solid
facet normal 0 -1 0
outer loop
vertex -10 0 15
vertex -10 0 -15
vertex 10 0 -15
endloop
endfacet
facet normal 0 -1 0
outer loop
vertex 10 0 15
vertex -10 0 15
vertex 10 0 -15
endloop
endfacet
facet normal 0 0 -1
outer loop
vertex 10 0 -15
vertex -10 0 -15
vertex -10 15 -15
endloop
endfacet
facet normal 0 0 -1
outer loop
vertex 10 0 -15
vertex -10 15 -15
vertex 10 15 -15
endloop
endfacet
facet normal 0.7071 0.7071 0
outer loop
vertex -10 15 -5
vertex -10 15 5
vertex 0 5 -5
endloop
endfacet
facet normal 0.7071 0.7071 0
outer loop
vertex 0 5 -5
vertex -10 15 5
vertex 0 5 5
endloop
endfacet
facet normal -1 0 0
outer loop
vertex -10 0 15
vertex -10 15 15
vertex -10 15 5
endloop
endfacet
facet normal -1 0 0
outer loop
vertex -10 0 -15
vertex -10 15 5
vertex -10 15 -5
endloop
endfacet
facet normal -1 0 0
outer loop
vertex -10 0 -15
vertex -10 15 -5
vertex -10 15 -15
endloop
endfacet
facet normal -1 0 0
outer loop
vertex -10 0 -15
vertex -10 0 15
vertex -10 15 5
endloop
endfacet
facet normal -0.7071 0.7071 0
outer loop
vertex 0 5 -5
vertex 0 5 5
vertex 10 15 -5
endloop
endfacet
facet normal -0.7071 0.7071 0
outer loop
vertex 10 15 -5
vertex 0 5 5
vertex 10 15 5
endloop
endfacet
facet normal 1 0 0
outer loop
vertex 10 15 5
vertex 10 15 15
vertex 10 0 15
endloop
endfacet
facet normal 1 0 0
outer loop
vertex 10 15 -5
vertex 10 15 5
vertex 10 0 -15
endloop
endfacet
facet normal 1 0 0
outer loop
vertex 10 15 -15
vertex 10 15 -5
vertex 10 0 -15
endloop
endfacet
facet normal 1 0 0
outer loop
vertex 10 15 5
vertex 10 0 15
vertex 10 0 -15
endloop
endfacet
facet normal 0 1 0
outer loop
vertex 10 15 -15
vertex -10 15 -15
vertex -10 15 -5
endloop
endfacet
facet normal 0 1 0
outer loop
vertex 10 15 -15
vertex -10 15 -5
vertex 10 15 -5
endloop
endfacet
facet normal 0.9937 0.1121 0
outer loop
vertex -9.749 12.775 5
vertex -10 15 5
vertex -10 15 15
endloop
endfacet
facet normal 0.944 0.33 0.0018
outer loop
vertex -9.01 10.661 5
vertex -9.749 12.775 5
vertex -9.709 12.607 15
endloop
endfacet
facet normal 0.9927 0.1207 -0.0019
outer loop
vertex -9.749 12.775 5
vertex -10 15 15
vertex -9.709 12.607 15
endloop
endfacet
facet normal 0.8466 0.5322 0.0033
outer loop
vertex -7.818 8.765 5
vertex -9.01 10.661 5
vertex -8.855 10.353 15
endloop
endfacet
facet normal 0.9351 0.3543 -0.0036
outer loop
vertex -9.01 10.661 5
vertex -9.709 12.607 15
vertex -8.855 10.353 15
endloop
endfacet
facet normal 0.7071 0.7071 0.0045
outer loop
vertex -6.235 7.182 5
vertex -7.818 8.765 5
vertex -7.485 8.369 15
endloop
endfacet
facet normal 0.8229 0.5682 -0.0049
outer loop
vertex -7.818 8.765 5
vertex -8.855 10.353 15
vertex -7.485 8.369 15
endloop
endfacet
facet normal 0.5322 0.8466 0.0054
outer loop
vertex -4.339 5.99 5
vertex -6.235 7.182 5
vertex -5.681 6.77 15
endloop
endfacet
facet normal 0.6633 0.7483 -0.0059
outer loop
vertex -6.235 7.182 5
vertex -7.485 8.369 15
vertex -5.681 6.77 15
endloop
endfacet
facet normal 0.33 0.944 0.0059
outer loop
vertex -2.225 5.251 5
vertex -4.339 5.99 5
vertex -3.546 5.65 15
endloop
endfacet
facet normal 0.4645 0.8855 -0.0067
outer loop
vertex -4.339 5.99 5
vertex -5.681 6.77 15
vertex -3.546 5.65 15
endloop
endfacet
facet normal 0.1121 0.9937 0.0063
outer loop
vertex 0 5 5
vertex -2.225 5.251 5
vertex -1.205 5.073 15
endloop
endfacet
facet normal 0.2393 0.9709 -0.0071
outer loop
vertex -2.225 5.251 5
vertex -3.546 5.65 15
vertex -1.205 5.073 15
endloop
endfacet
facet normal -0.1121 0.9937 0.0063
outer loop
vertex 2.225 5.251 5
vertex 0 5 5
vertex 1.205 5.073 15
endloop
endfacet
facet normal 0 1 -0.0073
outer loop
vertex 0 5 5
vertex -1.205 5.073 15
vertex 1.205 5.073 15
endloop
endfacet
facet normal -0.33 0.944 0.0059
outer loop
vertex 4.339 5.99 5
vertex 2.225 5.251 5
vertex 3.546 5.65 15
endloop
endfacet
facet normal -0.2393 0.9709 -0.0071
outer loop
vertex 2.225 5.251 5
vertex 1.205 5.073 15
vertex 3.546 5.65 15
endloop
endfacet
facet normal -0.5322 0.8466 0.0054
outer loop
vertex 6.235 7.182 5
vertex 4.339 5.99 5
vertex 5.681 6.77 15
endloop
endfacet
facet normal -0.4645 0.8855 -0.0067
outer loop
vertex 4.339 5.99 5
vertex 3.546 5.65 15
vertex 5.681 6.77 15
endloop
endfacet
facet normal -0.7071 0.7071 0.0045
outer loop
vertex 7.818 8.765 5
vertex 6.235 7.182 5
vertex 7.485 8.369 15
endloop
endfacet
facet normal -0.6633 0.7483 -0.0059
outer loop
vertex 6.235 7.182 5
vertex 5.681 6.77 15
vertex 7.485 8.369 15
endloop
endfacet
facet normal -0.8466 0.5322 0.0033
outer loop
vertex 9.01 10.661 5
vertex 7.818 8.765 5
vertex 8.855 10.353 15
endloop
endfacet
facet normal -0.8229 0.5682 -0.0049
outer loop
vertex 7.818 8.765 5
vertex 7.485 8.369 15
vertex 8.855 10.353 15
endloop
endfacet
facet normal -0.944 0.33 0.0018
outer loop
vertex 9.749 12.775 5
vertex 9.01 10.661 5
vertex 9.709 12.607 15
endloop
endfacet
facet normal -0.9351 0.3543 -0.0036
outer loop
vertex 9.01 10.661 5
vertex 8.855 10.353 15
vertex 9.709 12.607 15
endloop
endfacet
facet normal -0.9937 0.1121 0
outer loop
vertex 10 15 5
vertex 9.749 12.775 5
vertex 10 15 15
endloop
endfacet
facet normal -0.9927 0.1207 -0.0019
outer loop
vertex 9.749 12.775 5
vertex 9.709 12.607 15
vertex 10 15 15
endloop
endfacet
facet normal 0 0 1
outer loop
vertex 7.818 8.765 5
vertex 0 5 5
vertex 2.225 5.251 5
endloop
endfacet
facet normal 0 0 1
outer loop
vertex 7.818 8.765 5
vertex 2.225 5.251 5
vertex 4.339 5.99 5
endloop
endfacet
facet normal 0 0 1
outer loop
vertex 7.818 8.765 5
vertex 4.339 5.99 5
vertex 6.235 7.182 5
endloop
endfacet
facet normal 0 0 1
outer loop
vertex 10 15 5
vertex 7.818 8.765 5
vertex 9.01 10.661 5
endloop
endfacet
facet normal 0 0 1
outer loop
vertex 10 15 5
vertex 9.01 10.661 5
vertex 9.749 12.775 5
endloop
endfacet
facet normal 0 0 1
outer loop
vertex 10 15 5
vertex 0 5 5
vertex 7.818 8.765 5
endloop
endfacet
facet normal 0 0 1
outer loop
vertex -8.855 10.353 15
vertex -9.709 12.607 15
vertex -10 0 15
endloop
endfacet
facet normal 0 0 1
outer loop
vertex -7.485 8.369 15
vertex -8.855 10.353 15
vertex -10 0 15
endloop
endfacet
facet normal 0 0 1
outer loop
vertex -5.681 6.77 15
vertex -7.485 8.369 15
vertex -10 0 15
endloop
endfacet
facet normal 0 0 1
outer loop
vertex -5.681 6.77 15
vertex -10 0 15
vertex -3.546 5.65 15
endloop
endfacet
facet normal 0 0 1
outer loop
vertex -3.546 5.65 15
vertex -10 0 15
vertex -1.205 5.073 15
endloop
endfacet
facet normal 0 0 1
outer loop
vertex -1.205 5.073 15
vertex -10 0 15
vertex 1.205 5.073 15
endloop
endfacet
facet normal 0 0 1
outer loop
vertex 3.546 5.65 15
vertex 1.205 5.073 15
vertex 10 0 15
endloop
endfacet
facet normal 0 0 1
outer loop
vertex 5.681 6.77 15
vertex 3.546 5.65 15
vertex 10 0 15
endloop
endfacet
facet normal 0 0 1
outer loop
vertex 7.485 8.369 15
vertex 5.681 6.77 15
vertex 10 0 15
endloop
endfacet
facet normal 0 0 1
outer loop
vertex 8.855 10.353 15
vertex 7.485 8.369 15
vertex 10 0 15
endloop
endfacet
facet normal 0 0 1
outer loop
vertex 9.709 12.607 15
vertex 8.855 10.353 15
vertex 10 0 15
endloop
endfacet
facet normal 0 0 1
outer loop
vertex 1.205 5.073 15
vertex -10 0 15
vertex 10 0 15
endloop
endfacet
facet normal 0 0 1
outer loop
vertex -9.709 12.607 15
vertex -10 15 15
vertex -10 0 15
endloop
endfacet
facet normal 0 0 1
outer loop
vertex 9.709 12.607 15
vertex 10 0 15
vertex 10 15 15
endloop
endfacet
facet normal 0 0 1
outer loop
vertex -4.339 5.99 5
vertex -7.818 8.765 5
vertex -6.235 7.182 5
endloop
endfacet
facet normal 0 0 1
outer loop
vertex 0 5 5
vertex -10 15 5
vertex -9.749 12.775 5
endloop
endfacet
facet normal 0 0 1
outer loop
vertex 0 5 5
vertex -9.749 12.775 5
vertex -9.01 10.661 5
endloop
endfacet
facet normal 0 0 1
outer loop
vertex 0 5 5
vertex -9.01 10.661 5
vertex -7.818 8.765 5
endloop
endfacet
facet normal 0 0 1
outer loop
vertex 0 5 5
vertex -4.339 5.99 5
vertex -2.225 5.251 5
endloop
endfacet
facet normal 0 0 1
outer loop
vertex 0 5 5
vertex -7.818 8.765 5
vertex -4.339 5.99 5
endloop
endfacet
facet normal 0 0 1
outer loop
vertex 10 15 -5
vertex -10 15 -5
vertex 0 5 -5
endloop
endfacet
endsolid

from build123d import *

# Parameters (mm, degrees)
SKETCH_1_W          = 20
SKETCH_1_H          = 30
EXTRUDE_1_DEPTH     = 15
CUT_EXTRUDE_1_DEPTH = 10
CUT_EXTRUDE_2_DEPTH = 10


with BuildPart() as part:
    # 草圖1 → 填料-伸長1 (new body)
    with BuildSketch(Plane(origin=(0, 0, 0), x_dir=(1, 0, 0), z_dir=(0, 1, 0))):
        Rectangle(SKETCH_1_W, SKETCH_1_H)
    extrude(amount=EXTRUDE_1_DEPTH)

    # 草圖2 → 除料-伸長1 (cut)
    with BuildSketch(Plane.XY.offset(15)):
        with BuildLine():
            Line((10, 15), (-10, 15))
            ThreePointArc((-10, 15), (0, 5), (10, 15))
        make_face()
    extrude(amount=-CUT_EXTRUDE_1_DEPTH, mode=Mode.SUBTRACT)

    # 草圖3 → 除料-伸長2 (cut)
    with BuildSketch(Plane.XY.offset(5)):
        Polygon((-10, 15), (0, 5), (10, 15), align=None)
    extrude(amount=-CUT_EXTRUDE_2_DEPTH, mode=Mode.SUBTRACT)


solid = part.part
